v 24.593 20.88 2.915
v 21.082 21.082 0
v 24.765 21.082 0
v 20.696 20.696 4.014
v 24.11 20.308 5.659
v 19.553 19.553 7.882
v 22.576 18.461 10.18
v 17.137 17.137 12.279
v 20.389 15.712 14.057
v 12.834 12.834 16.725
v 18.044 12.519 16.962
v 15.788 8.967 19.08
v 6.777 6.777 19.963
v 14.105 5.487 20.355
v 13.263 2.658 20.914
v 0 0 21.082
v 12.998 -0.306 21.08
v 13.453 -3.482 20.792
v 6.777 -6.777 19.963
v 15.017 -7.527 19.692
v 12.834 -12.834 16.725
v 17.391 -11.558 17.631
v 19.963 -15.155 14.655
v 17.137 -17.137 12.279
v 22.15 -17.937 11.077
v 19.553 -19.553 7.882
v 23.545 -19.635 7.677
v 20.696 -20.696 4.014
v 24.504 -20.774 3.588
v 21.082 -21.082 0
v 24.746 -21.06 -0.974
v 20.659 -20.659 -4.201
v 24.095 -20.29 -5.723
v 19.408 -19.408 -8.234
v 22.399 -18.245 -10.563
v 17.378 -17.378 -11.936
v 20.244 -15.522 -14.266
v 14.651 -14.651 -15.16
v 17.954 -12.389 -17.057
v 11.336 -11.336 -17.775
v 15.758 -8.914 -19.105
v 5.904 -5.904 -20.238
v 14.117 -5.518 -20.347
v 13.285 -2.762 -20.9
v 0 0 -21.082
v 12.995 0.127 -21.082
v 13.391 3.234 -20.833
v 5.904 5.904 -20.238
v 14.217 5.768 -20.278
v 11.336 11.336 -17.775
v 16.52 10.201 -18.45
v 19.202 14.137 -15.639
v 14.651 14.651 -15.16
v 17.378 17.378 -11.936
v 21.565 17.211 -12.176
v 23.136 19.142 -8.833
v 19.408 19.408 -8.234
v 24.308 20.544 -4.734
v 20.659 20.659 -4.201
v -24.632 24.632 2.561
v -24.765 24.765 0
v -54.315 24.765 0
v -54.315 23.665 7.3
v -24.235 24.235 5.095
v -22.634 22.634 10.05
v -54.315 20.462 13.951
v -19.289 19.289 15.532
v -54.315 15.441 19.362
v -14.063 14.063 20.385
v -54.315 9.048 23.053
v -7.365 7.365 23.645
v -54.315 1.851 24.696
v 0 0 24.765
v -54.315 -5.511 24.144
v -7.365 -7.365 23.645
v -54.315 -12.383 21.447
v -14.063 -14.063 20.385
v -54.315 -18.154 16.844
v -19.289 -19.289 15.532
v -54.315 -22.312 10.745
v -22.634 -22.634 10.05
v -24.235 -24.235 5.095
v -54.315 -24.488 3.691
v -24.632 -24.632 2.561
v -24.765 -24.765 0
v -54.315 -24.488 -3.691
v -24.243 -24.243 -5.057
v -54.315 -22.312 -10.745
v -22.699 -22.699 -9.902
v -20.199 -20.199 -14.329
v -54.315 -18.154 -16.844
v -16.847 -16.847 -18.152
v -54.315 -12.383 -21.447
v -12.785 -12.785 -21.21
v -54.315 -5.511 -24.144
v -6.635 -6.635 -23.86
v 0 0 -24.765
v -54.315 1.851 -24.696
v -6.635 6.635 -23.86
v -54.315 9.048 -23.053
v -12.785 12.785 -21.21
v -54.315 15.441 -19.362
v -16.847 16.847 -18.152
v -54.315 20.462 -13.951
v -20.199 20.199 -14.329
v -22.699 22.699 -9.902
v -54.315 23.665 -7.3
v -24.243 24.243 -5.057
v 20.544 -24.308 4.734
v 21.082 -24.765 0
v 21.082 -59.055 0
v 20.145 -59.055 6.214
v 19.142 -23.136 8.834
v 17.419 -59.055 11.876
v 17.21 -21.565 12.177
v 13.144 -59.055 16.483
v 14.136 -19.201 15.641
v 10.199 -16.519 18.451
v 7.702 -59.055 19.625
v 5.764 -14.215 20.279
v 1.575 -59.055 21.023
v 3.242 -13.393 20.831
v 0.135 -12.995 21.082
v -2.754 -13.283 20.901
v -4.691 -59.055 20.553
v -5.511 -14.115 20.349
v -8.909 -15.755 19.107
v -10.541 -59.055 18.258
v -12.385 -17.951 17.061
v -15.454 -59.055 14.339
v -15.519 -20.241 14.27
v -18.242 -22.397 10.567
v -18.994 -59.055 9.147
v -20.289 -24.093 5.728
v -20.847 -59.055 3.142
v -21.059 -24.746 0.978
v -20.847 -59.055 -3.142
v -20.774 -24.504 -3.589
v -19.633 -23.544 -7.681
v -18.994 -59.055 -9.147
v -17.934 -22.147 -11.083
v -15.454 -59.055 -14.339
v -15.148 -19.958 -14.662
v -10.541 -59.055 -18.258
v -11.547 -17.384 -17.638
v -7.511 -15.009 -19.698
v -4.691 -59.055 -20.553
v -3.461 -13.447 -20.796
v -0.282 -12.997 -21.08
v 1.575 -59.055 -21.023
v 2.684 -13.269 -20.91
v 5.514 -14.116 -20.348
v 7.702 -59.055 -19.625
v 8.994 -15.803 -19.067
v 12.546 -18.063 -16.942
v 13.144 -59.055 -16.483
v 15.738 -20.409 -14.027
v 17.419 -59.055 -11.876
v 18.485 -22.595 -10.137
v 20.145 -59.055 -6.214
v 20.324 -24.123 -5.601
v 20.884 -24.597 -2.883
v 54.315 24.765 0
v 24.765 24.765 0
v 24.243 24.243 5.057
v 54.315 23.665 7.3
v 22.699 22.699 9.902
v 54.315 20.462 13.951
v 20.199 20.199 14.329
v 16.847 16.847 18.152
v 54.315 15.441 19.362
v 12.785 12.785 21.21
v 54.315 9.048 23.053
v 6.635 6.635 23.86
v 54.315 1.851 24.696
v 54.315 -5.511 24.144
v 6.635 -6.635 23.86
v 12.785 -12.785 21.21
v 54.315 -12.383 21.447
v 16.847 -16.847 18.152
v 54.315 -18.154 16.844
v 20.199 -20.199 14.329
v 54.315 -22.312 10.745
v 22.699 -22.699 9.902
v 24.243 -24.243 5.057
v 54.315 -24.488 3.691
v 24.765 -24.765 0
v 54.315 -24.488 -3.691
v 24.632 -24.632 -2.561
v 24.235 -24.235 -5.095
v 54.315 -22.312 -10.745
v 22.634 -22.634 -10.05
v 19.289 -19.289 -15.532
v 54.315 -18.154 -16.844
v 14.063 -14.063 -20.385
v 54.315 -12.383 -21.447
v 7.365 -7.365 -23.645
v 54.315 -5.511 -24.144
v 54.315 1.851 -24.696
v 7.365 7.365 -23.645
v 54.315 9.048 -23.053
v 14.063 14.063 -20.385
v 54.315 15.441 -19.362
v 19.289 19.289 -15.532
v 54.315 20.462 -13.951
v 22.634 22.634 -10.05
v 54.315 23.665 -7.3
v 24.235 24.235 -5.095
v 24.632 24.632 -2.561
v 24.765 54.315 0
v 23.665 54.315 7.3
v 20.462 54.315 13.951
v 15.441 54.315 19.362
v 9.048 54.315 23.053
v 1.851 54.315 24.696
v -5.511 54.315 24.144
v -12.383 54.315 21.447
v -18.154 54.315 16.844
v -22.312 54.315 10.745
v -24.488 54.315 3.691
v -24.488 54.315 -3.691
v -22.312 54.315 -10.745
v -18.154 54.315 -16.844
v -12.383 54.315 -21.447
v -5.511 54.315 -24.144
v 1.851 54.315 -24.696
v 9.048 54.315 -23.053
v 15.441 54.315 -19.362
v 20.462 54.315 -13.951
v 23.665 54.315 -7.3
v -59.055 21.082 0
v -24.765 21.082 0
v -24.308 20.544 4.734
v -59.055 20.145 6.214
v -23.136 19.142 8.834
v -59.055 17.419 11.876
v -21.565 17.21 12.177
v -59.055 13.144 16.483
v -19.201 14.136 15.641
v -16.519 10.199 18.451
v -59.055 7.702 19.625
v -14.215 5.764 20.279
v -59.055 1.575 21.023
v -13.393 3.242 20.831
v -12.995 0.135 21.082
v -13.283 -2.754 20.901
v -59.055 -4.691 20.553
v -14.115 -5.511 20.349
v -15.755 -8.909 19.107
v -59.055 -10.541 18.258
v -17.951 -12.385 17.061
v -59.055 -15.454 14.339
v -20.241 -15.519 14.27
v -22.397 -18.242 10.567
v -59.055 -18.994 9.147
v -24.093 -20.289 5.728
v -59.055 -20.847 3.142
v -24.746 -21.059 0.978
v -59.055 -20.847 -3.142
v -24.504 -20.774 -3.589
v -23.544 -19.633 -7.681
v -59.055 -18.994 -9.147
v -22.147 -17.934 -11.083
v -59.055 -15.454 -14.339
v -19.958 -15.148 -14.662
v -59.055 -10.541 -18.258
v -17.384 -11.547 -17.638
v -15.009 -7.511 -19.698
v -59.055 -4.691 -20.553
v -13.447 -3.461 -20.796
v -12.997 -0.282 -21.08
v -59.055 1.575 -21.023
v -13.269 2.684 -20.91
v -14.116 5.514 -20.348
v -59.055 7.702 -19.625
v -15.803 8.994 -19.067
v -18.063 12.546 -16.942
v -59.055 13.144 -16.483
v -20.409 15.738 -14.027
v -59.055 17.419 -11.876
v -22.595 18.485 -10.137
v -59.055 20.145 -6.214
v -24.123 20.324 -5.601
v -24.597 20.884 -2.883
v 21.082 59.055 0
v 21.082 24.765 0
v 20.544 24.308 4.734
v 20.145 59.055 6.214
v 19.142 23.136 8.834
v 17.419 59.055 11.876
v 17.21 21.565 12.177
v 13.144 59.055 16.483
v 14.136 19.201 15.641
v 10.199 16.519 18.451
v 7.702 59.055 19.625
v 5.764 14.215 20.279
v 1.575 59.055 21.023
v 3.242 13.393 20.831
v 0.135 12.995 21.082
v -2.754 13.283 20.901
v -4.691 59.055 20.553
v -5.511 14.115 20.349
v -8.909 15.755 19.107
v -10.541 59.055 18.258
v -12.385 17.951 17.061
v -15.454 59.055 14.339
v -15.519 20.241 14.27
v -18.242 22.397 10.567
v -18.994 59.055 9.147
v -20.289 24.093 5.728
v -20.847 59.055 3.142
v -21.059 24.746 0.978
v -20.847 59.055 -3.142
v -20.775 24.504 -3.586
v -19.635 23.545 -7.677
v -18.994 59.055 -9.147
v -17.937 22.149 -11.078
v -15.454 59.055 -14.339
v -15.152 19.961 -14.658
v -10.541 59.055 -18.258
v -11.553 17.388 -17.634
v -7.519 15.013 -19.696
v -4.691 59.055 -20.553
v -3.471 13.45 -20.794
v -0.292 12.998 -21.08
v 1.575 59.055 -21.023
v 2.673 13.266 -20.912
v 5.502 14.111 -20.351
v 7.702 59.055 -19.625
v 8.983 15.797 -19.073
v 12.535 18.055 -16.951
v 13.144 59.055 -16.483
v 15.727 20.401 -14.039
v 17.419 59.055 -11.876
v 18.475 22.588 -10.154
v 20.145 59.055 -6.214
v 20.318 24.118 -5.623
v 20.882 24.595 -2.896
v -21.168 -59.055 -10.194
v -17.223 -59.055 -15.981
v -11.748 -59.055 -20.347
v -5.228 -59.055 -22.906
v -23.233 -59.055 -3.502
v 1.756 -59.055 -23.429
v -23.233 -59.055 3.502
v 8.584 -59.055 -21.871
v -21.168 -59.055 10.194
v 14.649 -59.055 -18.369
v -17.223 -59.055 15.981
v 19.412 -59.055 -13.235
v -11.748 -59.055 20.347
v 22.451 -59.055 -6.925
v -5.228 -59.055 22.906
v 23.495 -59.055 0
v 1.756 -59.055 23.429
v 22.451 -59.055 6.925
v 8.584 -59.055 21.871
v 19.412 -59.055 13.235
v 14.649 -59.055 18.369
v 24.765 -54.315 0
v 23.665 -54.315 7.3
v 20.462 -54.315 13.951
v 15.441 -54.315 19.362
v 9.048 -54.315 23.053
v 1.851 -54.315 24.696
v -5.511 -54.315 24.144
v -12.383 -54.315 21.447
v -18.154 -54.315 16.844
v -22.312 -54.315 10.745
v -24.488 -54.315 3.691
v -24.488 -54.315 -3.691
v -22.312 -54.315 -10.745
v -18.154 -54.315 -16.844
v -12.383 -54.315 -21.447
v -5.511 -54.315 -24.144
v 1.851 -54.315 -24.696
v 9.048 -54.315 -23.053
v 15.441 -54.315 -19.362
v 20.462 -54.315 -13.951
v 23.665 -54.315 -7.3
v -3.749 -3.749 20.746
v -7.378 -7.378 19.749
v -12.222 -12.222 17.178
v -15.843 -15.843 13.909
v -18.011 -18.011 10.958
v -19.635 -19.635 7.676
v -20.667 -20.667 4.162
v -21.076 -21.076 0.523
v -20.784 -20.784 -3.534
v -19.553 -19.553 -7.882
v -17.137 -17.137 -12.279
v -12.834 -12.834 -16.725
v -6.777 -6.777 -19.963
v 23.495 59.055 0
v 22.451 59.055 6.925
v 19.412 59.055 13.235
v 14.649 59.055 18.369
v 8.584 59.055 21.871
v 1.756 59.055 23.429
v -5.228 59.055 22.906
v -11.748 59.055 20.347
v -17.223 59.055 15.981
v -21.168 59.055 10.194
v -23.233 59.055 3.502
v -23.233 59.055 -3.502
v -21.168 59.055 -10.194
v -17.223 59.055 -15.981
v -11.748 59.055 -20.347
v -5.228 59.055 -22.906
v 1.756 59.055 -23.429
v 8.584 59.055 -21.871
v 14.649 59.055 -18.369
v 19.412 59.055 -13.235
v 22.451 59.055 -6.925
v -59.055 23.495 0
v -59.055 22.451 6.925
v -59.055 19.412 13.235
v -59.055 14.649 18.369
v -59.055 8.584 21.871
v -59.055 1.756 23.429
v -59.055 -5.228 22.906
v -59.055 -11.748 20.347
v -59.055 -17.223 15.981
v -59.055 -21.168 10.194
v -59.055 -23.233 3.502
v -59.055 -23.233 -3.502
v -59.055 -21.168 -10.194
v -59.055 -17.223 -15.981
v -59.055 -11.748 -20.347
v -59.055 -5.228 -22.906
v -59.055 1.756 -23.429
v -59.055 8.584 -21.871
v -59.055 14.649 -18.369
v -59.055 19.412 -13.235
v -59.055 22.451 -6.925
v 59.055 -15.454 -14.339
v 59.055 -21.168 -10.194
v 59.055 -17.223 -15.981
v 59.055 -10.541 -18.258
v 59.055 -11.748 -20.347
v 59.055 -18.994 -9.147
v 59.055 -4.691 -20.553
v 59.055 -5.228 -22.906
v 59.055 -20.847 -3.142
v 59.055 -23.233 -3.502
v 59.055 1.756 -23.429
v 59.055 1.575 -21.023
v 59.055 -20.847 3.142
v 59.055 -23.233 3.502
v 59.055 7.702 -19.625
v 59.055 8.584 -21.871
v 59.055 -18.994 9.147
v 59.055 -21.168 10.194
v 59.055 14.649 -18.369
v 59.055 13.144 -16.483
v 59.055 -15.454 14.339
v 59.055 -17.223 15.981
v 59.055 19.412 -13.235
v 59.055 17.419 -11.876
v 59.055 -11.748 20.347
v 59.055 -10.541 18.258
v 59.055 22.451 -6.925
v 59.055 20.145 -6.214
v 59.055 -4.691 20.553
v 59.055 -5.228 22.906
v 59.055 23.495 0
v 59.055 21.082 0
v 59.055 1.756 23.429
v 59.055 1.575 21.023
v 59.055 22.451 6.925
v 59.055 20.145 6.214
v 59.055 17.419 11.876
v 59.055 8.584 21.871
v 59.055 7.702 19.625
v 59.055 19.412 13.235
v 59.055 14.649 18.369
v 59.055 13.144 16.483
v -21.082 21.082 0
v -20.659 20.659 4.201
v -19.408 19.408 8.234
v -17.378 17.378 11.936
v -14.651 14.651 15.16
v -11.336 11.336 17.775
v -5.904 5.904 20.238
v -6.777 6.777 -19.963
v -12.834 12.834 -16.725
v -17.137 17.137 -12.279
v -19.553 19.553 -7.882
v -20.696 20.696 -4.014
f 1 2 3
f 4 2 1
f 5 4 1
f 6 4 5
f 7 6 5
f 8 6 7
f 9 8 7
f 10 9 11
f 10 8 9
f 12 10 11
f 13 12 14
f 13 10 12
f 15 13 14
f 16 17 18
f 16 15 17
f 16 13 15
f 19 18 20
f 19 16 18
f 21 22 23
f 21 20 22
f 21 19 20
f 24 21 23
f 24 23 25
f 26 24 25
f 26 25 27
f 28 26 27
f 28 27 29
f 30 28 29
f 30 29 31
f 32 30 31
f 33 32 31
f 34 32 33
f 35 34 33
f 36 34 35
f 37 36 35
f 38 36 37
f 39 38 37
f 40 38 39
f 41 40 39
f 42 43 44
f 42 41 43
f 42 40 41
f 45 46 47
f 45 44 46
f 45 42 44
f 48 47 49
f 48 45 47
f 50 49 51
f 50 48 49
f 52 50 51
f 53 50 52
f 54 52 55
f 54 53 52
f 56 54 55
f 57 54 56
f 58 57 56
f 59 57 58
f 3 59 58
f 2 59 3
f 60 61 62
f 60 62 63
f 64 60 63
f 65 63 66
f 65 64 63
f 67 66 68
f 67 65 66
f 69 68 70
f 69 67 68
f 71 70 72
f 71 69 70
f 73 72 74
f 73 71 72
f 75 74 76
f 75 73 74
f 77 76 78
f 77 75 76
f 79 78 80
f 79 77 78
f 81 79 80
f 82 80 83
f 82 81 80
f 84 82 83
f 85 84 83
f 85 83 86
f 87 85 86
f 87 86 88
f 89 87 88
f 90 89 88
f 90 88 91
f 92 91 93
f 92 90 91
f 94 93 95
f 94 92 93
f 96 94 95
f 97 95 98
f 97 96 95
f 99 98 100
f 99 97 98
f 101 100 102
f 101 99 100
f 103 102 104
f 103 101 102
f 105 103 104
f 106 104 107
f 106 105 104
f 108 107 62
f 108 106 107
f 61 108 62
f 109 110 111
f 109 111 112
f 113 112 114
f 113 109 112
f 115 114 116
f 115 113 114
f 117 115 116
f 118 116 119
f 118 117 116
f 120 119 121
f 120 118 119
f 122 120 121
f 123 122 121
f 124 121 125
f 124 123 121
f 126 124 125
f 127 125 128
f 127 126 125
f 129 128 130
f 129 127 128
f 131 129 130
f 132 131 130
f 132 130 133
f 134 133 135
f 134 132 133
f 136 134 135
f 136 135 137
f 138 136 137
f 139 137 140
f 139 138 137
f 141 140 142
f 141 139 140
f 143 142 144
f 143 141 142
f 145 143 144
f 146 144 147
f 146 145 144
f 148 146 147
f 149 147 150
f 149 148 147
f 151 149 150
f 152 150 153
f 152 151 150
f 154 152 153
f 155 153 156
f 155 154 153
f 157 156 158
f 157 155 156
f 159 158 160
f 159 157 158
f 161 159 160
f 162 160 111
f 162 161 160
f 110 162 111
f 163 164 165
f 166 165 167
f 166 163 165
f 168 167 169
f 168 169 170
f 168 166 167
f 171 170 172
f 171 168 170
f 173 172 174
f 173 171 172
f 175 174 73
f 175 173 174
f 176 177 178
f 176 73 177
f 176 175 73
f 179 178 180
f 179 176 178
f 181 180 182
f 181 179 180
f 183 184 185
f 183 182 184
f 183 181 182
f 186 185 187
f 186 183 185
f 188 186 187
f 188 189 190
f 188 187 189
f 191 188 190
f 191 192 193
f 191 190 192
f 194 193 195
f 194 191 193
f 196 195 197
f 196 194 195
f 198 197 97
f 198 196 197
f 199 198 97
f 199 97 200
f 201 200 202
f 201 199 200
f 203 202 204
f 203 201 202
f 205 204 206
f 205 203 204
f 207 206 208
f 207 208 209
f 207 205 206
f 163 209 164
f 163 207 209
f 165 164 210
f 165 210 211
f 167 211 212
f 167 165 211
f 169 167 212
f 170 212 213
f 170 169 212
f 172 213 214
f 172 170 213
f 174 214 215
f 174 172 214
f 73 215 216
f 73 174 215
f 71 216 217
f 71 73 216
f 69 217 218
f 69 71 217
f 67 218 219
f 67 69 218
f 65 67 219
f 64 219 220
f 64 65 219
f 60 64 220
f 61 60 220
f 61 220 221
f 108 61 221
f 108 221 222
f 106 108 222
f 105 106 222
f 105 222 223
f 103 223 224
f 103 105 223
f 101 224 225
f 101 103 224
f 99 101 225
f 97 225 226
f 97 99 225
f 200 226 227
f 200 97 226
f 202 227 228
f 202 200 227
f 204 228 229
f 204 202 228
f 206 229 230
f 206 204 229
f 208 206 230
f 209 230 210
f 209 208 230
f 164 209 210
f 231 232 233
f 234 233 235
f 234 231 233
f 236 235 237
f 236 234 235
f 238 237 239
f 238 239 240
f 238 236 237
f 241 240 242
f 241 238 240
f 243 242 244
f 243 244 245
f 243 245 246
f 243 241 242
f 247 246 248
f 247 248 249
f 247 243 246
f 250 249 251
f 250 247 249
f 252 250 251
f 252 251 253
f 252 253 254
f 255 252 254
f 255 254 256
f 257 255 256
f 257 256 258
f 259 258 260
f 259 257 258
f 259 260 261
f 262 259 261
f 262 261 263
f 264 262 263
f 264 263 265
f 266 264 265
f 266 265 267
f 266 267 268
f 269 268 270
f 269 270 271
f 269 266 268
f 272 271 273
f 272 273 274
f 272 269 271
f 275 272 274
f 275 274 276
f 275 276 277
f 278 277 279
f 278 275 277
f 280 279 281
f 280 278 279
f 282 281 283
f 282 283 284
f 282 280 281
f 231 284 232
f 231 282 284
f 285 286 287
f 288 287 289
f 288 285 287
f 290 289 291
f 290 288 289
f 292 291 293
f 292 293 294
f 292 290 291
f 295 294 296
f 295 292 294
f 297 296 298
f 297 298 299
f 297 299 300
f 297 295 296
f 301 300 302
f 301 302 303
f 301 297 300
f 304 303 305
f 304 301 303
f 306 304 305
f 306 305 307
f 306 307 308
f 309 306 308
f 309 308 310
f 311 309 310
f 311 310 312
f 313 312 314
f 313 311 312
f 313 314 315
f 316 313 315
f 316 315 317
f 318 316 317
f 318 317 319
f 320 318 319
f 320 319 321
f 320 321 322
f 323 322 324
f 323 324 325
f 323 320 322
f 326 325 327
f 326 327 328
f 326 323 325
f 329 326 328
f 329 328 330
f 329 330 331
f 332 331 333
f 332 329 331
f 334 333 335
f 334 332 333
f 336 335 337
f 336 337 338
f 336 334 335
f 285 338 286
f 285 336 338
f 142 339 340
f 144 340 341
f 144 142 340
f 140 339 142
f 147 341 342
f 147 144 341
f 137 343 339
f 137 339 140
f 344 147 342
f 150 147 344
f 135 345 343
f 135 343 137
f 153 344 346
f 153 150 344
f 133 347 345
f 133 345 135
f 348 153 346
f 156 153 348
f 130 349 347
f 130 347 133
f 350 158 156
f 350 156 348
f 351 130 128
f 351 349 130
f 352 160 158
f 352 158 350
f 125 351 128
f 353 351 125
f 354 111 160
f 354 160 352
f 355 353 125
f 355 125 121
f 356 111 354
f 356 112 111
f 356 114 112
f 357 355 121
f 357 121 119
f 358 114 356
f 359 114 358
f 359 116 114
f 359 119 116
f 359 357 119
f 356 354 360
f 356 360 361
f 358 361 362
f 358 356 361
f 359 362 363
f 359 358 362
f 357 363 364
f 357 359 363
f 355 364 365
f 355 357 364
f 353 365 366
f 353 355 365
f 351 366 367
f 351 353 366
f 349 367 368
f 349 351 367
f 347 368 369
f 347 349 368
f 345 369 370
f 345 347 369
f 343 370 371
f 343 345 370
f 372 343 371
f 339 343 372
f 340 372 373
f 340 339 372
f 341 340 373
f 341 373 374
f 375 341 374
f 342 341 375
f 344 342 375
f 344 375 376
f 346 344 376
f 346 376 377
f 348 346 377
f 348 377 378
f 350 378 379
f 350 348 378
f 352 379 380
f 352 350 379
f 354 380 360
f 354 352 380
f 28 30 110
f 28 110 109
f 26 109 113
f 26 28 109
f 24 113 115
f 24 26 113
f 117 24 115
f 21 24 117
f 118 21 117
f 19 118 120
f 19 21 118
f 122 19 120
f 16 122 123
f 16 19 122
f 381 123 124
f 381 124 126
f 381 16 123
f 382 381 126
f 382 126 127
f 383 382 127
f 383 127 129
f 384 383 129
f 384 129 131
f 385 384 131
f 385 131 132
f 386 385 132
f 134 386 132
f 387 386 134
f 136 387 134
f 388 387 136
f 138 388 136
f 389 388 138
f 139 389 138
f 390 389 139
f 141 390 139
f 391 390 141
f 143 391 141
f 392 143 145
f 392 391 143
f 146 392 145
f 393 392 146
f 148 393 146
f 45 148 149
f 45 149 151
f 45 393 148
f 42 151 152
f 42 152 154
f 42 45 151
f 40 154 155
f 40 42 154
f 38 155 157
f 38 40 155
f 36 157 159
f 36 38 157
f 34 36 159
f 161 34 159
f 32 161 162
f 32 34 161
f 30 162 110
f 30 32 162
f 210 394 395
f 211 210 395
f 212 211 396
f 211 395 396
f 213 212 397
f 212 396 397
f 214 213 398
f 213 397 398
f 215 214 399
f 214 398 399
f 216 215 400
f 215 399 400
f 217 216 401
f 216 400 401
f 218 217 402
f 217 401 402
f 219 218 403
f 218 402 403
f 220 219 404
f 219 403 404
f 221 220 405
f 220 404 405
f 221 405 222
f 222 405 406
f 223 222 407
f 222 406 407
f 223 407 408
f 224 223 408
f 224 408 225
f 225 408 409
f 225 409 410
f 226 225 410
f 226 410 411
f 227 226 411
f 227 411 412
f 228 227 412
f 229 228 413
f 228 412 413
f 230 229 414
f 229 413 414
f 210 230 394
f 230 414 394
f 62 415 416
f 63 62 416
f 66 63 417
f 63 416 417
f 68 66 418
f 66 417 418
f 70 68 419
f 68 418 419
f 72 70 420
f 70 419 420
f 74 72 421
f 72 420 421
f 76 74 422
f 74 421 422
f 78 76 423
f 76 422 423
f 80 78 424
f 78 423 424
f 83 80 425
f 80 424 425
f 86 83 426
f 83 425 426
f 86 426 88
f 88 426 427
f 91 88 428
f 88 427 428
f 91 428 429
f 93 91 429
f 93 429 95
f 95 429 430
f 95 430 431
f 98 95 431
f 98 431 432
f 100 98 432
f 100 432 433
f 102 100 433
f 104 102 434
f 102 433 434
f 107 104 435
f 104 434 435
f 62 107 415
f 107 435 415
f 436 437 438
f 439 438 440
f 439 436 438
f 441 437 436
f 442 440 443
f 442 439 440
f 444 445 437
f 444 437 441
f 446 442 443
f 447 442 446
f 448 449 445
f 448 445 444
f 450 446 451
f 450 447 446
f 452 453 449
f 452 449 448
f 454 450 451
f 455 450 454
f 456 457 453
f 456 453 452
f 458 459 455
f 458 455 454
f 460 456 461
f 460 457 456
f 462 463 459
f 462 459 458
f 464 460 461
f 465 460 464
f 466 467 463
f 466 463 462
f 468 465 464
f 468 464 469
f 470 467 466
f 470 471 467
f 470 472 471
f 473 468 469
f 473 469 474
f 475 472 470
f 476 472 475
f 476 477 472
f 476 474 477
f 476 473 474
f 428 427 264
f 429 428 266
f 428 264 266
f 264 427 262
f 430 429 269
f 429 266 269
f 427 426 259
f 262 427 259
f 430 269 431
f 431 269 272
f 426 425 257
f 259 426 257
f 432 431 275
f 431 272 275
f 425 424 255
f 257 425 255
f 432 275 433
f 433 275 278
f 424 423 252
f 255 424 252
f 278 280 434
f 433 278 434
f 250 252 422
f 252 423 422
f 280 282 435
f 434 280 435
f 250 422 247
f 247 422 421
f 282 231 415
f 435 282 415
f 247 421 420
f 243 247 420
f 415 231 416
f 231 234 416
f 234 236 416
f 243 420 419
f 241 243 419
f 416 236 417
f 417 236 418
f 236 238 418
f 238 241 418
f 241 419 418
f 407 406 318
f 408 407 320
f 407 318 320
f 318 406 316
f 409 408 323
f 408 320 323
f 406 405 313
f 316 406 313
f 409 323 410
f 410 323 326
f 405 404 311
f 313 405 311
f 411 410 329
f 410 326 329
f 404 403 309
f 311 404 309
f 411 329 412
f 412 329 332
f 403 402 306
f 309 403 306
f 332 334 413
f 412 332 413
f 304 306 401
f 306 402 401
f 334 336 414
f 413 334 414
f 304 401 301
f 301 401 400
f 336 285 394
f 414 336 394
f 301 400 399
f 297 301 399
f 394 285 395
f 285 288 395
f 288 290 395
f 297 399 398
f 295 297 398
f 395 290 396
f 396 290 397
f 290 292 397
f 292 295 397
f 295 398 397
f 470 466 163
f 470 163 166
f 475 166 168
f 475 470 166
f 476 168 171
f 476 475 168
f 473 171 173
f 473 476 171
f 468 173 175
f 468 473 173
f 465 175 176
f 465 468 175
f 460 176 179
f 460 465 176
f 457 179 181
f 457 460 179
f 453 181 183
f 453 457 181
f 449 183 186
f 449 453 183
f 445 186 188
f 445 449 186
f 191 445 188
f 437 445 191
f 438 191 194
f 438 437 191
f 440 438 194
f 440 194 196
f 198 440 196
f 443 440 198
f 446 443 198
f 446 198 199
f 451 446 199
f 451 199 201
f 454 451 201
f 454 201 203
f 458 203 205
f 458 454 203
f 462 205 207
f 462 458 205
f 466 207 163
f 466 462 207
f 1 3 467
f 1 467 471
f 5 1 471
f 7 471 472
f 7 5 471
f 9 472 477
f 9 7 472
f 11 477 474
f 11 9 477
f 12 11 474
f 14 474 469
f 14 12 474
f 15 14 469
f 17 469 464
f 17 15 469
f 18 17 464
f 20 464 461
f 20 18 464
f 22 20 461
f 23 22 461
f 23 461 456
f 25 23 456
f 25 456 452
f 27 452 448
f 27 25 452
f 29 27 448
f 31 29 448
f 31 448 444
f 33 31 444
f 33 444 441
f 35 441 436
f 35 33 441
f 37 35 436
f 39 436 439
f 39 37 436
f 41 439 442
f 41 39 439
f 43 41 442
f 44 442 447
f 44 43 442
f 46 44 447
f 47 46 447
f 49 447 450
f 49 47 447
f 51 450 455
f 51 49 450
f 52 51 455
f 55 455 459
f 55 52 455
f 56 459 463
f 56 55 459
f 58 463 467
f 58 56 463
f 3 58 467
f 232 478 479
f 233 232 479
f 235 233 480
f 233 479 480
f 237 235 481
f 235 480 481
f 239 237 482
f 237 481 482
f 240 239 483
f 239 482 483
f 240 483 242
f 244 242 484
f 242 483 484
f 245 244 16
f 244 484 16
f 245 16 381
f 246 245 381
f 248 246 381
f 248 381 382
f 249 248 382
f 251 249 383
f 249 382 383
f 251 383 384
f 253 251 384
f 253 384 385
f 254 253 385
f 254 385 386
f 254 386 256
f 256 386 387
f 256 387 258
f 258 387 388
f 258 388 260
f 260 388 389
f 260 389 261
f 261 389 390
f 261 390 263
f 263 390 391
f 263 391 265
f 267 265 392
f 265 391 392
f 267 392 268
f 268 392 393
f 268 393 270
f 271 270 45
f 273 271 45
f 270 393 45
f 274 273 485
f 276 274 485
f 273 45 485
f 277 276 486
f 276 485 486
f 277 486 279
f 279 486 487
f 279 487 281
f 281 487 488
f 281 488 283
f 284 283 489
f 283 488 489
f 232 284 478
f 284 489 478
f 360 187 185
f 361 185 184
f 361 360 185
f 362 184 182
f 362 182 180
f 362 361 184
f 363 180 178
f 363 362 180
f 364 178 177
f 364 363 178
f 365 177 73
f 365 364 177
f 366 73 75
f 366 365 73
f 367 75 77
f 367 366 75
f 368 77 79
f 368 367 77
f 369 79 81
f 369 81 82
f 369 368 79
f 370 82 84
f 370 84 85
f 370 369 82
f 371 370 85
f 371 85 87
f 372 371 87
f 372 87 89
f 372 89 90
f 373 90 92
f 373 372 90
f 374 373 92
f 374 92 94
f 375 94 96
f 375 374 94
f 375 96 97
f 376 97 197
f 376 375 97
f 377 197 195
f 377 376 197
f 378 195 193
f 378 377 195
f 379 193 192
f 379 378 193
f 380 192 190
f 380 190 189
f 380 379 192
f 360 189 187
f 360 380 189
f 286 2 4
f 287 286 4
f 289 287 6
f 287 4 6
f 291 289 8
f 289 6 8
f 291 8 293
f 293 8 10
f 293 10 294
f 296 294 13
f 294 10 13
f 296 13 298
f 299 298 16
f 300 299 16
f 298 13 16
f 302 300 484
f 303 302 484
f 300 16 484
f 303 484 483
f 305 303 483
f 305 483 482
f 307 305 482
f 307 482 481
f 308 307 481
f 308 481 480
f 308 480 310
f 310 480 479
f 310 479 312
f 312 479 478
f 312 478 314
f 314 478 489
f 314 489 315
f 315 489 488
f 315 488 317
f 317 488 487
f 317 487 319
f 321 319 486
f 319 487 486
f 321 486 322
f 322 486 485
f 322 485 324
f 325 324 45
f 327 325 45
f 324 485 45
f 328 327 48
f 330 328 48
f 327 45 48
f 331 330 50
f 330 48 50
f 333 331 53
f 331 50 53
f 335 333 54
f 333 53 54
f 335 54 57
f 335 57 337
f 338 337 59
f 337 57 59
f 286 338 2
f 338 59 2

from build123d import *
from build123d import SkipClean  # not in build123d's __all__

# Parameters (mm, degrees)
F0_R          = 24.765
F0_R_2        = 21.082
F1_DEPTH      = 59.055
F2_R          = 24.765
F2_R_2        = 21.082
F3_DEPTH      = 59.055
F4_DEPTH      = 59.0560001
F4_DEPTH_BACK = 59.0560001
F5_DEPTH      = 59.0560001
F5_DEPTH_BACK = 59.0560001
F6_SIZE2      = 1.27
F6_SIZE       = 4.7397045256
F6_2_SIZE2    = 1.27
F6_2_SIZE     = 4.7397045256
F6_3_SIZE2    = 1.27
F6_3_SIZE     = 4.7397045256
F6_4_SIZE2    = 1.27
F6_4_SIZE     = 4.7397045256


# Not quite as in the source:
# - two fillets or chamfers of one size are made in one step


with BuildPart() as f1:
    # F0 (on Front) → F1 (new body, symmetric)
    with BuildSketch(Plane.XZ):
        Circle(F0_R)
        Circle(F0_R_2, mode=Mode.SUBTRACT)
    extrude(amount=F1_DEPTH, both=True)

    # F2 (on Right) → F3 (join, symmetric)
    with BuildSketch(Plane.YZ):
        Circle(F2_R)
        Circle(F2_R_2, mode=Mode.SUBTRACT)
    extrude(amount=F3_DEPTH, both=True)

    # F2 (on Right) → F4 (cut, two sides)
    with BuildSketch(Plane.YZ) as f4_sk:
        Circle(F2_R_2)
    with SkipClean():  # cleaning this boolean's faces spoils the solid; the shape is the same uncleaned
        extrude(amount=F4_DEPTH, mode=Mode.SUBTRACT)
        extrude(f4_sk.sketch, amount=-F4_DEPTH_BACK, mode=Mode.SUBTRACT)

    # F0 (on Front) → F5 (cut, two sides)
    with BuildSketch(Plane.XZ) as f5_sk:
        Circle(F0_R_2)
    extrude(amount=F5_DEPTH, mode=Mode.SUBTRACT)
    extrude(f5_sk.sketch, amount=-F5_DEPTH_BACK, mode=Mode.SUBTRACT)

    # F6
    f6_edges = [f1.edges().sort_by_distance(p)[0] for p in [
        (-59.055, -24.765, 0),
    ]]
    f6_side = f1.faces().sort_by_distance((-29.5275, -24.765, 0))[0]
    chamfer(f6_edges, length=F6_SIZE, length2=F6_SIZE2, reference=f6_side)

    # F6#2
    f6_2_edges = [f1.edges().sort_by_distance(p)[0] for p in [
        (59.055, -24.765, 0),
    ]]
    f6_2_side = f1.faces().sort_by_distance((29.5275, -24.765, 0))[0]
    chamfer(f6_2_edges, length=F6_2_SIZE, length2=F6_2_SIZE2, reference=f6_2_side)

    # F6#3
    f6_3_edges = [f1.edges().sort_by_distance(p)[0] for p in [
        (-24.765, -59.055, 0),
    ]]
    f6_3_side = f1.faces().sort_by_distance((-24.765, -29.5275, 0))[0]
    chamfer(f6_3_edges, length=F6_3_SIZE, length2=F6_3_SIZE2, reference=f6_3_side)

    # F6#4
    f6_4_edges = [f1.edges().sort_by_distance(p)[0] for p in [
        (-24.765, 59.055, 0),
    ]]
    f6_4_side = f1.faces().sort_by_distance((-24.765, 29.5275, 0))[0]
    chamfer(f6_4_edges, length=F6_4_SIZE, length2=F6_4_SIZE2, reference=f6_4_side)


solid = f1.part
